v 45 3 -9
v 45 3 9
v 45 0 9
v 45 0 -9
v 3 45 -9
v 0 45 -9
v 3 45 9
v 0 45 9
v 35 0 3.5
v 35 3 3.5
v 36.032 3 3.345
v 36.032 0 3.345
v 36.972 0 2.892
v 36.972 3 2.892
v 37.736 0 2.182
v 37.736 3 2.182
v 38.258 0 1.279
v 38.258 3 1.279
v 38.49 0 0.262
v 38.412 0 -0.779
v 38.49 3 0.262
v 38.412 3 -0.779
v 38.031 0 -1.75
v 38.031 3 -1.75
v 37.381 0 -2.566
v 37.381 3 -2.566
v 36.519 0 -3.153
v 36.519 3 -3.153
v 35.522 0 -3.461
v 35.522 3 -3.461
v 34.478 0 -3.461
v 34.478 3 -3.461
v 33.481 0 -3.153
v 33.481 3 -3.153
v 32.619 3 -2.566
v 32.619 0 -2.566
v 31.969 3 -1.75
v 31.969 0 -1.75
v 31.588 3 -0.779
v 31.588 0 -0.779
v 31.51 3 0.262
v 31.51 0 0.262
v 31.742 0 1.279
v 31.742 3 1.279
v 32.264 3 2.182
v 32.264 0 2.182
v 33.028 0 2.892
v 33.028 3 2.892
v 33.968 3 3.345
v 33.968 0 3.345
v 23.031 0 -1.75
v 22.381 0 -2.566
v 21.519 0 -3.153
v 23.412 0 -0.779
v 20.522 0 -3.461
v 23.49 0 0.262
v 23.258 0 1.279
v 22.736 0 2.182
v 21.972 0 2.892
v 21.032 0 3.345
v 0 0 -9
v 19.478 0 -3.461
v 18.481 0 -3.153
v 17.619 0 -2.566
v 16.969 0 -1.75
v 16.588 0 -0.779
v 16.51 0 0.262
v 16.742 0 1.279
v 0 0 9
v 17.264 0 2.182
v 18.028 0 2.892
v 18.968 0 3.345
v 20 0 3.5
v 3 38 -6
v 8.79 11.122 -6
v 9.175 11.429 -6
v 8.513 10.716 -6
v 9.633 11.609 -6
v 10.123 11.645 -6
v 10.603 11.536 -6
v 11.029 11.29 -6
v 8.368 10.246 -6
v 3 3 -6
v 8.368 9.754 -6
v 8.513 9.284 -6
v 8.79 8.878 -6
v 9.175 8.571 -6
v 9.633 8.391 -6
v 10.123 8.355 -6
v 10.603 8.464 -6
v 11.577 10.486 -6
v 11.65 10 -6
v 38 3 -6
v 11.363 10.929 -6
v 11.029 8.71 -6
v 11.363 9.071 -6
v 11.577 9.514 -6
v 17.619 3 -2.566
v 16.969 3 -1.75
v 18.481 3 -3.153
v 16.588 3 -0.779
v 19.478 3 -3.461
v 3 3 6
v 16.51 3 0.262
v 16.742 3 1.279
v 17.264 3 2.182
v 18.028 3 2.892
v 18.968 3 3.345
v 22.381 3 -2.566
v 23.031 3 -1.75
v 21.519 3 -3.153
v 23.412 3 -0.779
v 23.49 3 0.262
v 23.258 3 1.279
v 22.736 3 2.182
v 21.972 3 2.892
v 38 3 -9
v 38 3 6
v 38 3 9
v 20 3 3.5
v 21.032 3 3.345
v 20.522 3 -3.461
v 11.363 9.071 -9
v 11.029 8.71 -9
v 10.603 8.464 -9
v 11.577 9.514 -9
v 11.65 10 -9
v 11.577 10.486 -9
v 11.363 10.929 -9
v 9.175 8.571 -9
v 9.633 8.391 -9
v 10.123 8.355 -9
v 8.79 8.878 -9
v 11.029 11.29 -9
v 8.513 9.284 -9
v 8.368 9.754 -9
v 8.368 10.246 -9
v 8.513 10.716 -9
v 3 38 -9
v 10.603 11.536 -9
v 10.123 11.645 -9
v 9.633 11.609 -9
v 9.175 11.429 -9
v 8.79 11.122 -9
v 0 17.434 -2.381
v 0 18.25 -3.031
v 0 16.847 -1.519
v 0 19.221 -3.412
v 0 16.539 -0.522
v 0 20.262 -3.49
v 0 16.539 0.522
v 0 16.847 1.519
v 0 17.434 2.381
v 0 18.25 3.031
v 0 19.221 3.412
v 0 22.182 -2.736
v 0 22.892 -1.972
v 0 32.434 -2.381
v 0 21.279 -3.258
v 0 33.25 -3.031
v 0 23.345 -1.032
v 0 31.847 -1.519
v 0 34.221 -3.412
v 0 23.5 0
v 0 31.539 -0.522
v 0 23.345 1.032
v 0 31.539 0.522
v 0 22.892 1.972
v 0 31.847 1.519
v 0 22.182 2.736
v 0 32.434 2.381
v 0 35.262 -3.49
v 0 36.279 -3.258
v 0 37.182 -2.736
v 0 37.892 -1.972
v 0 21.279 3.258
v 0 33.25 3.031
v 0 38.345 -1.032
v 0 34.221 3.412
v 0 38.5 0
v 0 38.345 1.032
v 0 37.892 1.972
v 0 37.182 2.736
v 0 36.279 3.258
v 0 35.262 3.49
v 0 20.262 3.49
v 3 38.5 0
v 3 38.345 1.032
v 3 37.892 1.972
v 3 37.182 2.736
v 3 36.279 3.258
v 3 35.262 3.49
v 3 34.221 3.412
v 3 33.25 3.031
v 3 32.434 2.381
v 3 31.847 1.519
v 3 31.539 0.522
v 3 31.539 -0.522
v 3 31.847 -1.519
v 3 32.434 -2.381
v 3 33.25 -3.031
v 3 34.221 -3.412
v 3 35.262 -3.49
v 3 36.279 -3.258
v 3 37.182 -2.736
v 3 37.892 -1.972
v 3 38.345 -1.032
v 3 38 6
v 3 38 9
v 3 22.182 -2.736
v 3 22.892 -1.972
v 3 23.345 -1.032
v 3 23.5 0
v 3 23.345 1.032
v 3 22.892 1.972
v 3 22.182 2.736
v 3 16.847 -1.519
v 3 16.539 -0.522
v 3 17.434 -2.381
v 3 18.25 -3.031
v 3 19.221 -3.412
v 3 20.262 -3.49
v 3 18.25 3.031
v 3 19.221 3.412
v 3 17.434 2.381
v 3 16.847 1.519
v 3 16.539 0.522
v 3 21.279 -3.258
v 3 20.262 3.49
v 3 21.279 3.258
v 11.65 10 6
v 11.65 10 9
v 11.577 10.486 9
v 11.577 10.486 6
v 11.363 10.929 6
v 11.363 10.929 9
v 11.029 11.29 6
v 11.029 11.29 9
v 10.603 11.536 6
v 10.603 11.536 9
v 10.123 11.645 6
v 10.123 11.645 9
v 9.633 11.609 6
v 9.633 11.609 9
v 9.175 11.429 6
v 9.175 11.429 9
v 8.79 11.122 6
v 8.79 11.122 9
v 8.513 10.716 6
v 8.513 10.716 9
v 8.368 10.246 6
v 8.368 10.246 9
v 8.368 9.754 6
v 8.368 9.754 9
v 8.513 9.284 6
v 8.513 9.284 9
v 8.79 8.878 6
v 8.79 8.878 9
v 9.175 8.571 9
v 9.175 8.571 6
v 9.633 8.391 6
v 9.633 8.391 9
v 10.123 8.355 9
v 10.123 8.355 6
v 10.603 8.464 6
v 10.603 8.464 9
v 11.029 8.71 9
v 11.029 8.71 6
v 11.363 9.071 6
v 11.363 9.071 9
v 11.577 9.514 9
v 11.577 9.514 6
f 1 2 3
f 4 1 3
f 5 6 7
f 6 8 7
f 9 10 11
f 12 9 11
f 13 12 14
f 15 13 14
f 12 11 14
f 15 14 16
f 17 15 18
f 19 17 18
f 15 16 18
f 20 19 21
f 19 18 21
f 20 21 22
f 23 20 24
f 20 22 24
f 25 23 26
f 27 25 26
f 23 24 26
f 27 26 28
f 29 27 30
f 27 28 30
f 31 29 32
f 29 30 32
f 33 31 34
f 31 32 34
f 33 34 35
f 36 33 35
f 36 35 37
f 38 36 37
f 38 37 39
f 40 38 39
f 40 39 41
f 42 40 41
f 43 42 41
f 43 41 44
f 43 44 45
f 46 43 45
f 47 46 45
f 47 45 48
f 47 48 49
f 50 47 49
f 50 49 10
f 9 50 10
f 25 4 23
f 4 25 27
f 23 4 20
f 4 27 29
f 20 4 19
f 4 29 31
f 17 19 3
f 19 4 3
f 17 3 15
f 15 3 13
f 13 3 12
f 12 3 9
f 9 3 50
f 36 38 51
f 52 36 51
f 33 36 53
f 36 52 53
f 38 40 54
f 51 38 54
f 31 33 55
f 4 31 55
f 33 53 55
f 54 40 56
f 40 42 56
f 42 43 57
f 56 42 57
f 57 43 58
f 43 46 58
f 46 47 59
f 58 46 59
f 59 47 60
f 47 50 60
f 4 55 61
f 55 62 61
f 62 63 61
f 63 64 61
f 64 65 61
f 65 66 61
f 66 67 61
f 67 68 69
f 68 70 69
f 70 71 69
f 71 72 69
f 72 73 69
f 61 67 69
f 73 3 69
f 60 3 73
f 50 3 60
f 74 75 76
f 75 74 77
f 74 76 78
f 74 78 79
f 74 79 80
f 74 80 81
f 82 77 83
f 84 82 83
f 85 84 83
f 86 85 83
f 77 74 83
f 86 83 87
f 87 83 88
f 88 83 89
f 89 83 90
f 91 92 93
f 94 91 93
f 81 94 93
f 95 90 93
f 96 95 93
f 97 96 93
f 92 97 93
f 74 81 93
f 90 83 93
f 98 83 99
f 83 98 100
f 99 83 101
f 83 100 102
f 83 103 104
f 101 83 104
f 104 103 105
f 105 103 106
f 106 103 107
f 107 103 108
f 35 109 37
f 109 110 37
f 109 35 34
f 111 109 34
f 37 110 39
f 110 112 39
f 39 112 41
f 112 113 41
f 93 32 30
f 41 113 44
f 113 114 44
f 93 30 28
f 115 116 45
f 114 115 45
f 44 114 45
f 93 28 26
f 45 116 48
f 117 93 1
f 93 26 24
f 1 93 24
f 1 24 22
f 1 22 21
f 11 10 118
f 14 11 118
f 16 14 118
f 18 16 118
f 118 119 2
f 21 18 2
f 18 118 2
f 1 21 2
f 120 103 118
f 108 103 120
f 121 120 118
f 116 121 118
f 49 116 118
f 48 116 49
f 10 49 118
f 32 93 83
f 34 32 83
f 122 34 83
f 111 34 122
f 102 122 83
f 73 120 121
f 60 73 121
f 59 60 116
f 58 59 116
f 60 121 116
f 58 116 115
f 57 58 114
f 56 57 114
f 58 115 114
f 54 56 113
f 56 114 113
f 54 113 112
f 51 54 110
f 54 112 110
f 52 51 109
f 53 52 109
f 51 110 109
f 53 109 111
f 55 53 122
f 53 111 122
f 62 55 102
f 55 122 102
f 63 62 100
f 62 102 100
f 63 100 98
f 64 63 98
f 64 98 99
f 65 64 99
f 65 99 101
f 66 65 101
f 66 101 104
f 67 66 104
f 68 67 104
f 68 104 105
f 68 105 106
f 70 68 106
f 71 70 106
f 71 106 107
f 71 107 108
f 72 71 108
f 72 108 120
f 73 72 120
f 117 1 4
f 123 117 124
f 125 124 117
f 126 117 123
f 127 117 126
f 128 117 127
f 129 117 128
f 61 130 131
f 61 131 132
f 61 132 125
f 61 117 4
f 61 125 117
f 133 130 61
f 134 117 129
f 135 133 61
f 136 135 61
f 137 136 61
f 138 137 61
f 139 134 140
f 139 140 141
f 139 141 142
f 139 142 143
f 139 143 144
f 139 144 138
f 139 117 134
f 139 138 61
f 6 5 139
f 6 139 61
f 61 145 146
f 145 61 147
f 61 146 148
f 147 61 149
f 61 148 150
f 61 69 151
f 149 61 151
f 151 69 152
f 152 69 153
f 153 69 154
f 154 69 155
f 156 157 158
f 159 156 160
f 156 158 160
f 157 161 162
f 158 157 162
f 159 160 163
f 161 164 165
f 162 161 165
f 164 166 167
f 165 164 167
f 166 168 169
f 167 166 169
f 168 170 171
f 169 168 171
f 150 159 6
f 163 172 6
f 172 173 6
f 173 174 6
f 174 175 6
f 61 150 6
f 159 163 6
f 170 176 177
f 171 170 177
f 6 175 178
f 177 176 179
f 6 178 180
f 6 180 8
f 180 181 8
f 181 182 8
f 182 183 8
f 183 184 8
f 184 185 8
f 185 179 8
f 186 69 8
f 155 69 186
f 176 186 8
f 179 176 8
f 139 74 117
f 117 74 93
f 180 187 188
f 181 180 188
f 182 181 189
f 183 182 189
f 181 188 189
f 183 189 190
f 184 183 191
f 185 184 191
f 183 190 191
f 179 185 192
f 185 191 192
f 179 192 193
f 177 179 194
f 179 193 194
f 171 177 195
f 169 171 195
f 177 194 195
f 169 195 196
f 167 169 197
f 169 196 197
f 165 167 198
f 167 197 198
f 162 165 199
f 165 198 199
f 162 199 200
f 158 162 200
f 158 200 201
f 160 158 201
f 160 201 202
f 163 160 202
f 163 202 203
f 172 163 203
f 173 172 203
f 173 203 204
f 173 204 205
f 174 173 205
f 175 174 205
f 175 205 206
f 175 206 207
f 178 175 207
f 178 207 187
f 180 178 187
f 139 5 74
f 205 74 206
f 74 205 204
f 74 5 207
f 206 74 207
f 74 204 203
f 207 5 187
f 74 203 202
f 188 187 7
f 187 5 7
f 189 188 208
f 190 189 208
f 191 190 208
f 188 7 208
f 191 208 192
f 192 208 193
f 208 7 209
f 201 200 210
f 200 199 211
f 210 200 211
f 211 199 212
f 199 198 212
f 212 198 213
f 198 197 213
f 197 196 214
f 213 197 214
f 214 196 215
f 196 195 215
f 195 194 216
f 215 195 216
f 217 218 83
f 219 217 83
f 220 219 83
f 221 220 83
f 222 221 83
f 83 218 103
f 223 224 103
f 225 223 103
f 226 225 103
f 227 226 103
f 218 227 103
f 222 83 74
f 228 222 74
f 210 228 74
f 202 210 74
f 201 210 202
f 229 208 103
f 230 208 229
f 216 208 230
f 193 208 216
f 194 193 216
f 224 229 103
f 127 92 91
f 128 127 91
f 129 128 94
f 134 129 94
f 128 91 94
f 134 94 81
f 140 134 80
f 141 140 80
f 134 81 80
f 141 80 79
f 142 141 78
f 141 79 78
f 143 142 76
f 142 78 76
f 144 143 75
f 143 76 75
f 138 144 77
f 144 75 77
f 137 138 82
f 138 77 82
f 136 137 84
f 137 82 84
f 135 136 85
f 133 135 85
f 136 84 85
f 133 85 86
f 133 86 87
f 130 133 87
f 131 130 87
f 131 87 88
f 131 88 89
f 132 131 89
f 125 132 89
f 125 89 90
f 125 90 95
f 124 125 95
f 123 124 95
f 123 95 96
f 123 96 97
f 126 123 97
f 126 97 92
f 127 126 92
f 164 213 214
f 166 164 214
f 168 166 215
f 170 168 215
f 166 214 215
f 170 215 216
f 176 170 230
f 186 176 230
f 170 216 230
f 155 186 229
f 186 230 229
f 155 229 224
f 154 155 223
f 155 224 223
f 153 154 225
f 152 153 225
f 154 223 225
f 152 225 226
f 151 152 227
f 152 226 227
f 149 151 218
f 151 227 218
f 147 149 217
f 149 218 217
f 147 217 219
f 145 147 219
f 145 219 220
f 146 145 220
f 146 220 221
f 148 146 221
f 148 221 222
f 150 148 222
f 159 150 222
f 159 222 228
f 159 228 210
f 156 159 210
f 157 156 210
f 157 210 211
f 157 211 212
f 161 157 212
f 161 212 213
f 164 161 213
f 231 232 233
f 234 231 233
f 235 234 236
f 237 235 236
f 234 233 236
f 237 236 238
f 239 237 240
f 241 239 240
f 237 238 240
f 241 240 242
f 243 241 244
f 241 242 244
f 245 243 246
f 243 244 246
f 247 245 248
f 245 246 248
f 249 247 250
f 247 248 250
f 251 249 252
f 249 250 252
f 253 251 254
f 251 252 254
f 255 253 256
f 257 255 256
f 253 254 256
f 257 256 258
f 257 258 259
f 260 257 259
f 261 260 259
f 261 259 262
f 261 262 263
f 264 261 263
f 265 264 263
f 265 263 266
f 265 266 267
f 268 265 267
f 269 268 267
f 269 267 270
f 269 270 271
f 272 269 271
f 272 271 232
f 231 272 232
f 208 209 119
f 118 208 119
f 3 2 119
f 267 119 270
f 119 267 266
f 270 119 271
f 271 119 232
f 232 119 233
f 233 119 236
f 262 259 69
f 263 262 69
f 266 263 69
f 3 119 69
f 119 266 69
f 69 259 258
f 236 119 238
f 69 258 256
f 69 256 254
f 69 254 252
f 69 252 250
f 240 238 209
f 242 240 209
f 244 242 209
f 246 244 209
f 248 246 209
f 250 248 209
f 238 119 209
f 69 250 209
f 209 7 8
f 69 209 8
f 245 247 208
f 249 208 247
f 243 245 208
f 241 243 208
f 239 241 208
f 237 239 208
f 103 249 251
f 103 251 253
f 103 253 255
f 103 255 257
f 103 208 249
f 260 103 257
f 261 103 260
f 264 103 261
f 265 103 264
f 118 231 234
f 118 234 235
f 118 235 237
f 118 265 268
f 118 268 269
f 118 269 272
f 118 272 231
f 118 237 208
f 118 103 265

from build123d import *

# Parameters (mm, degrees)
EXTRUDE_1_DEPTH     = 9
SHELL_START         = 3
SHELL_1_OUTLINE_W   = 37
SHELL_1_OUTLINE_H   = 12
SHELL_1_DEPTH       = 35
SKETCH_5_R          = 3.5
CUT_EXTRUDE_1_DEPTH = 63.20932406
SKETCH_6_R          = 3.5
CUT_EXTRUDE_2_DEPTH = 63.20932406
HOLE_WIZARD_M4_1_D  = 3.3


# Read off the part's stored shape, not the designer's step: 抽壳1
with BuildPart() as part:
    # 草图1 → 凸台-拉伸1 (new, symmetric)
    with BuildSketch(Plane.XY):
        Polygon((0, 0), (0, 45), (3, 45), (3, 38), (38, 3), (45, 3), (45, 0), align=None)
    extrude(amount=EXTRUDE_1_DEPTH, both=True)

    # 抽壳1 outline → 抽壳1 (cut)
    with BuildSketch(Plane(origin=(0, 0, 0), x_dir=(1, 0, 0), z_dir=(0, 1, 0)).offset(SHELL_START)):
        with Locations((21.5, 0)):
            Rectangle(SHELL_1_OUTLINE_W, SHELL_1_OUTLINE_H)
    extrude(amount=SHELL_1_DEPTH, mode=Mode.SUBTRACT)

    # 草图5 → 切除-拉伸1 (cut, through all)
    with BuildSketch(Plane(origin=(0, 3, 0), x_dir=(1, 0, 0), z_dir=(0, 1, 0))):
        with Locations(Location((20, 0, 0), (0, 0, 270))):
            Circle(SKETCH_5_R)
        with Locations(Location((35, 0, 0), (0, 0, 270))):
            Circle(SKETCH_5_R)
    extrude(amount=-CUT_EXTRUDE_1_DEPTH, mode=Mode.SUBTRACT)

    # 草图6 → 切除-拉伸2 (cut, through all)
    with BuildSketch(Plane(origin=(3, 0, 0), x_dir=(0, 0, -1), z_dir=(1, 0, 0))):
        with Locations(Location((0, 20, 0), (0, 0, 90))):
            Circle(SKETCH_6_R)
        with Locations(Location((0, 35, 0), (0, 0, 90))):
            Circle(SKETCH_6_R)
    extrude(amount=-CUT_EXTRUDE_2_DEPTH, mode=Mode.SUBTRACT)

    # M4 螺纹孔1 (through all)
    with Locations(Plane(origin=(0, 0, -9), x_dir=(-1, 0, 0), z_dir=(0, 0, -1))):
        with Locations((-10, 10)):
            Hole(HOLE_WIZARD_M4_1_D / 2)


solid = part.part
